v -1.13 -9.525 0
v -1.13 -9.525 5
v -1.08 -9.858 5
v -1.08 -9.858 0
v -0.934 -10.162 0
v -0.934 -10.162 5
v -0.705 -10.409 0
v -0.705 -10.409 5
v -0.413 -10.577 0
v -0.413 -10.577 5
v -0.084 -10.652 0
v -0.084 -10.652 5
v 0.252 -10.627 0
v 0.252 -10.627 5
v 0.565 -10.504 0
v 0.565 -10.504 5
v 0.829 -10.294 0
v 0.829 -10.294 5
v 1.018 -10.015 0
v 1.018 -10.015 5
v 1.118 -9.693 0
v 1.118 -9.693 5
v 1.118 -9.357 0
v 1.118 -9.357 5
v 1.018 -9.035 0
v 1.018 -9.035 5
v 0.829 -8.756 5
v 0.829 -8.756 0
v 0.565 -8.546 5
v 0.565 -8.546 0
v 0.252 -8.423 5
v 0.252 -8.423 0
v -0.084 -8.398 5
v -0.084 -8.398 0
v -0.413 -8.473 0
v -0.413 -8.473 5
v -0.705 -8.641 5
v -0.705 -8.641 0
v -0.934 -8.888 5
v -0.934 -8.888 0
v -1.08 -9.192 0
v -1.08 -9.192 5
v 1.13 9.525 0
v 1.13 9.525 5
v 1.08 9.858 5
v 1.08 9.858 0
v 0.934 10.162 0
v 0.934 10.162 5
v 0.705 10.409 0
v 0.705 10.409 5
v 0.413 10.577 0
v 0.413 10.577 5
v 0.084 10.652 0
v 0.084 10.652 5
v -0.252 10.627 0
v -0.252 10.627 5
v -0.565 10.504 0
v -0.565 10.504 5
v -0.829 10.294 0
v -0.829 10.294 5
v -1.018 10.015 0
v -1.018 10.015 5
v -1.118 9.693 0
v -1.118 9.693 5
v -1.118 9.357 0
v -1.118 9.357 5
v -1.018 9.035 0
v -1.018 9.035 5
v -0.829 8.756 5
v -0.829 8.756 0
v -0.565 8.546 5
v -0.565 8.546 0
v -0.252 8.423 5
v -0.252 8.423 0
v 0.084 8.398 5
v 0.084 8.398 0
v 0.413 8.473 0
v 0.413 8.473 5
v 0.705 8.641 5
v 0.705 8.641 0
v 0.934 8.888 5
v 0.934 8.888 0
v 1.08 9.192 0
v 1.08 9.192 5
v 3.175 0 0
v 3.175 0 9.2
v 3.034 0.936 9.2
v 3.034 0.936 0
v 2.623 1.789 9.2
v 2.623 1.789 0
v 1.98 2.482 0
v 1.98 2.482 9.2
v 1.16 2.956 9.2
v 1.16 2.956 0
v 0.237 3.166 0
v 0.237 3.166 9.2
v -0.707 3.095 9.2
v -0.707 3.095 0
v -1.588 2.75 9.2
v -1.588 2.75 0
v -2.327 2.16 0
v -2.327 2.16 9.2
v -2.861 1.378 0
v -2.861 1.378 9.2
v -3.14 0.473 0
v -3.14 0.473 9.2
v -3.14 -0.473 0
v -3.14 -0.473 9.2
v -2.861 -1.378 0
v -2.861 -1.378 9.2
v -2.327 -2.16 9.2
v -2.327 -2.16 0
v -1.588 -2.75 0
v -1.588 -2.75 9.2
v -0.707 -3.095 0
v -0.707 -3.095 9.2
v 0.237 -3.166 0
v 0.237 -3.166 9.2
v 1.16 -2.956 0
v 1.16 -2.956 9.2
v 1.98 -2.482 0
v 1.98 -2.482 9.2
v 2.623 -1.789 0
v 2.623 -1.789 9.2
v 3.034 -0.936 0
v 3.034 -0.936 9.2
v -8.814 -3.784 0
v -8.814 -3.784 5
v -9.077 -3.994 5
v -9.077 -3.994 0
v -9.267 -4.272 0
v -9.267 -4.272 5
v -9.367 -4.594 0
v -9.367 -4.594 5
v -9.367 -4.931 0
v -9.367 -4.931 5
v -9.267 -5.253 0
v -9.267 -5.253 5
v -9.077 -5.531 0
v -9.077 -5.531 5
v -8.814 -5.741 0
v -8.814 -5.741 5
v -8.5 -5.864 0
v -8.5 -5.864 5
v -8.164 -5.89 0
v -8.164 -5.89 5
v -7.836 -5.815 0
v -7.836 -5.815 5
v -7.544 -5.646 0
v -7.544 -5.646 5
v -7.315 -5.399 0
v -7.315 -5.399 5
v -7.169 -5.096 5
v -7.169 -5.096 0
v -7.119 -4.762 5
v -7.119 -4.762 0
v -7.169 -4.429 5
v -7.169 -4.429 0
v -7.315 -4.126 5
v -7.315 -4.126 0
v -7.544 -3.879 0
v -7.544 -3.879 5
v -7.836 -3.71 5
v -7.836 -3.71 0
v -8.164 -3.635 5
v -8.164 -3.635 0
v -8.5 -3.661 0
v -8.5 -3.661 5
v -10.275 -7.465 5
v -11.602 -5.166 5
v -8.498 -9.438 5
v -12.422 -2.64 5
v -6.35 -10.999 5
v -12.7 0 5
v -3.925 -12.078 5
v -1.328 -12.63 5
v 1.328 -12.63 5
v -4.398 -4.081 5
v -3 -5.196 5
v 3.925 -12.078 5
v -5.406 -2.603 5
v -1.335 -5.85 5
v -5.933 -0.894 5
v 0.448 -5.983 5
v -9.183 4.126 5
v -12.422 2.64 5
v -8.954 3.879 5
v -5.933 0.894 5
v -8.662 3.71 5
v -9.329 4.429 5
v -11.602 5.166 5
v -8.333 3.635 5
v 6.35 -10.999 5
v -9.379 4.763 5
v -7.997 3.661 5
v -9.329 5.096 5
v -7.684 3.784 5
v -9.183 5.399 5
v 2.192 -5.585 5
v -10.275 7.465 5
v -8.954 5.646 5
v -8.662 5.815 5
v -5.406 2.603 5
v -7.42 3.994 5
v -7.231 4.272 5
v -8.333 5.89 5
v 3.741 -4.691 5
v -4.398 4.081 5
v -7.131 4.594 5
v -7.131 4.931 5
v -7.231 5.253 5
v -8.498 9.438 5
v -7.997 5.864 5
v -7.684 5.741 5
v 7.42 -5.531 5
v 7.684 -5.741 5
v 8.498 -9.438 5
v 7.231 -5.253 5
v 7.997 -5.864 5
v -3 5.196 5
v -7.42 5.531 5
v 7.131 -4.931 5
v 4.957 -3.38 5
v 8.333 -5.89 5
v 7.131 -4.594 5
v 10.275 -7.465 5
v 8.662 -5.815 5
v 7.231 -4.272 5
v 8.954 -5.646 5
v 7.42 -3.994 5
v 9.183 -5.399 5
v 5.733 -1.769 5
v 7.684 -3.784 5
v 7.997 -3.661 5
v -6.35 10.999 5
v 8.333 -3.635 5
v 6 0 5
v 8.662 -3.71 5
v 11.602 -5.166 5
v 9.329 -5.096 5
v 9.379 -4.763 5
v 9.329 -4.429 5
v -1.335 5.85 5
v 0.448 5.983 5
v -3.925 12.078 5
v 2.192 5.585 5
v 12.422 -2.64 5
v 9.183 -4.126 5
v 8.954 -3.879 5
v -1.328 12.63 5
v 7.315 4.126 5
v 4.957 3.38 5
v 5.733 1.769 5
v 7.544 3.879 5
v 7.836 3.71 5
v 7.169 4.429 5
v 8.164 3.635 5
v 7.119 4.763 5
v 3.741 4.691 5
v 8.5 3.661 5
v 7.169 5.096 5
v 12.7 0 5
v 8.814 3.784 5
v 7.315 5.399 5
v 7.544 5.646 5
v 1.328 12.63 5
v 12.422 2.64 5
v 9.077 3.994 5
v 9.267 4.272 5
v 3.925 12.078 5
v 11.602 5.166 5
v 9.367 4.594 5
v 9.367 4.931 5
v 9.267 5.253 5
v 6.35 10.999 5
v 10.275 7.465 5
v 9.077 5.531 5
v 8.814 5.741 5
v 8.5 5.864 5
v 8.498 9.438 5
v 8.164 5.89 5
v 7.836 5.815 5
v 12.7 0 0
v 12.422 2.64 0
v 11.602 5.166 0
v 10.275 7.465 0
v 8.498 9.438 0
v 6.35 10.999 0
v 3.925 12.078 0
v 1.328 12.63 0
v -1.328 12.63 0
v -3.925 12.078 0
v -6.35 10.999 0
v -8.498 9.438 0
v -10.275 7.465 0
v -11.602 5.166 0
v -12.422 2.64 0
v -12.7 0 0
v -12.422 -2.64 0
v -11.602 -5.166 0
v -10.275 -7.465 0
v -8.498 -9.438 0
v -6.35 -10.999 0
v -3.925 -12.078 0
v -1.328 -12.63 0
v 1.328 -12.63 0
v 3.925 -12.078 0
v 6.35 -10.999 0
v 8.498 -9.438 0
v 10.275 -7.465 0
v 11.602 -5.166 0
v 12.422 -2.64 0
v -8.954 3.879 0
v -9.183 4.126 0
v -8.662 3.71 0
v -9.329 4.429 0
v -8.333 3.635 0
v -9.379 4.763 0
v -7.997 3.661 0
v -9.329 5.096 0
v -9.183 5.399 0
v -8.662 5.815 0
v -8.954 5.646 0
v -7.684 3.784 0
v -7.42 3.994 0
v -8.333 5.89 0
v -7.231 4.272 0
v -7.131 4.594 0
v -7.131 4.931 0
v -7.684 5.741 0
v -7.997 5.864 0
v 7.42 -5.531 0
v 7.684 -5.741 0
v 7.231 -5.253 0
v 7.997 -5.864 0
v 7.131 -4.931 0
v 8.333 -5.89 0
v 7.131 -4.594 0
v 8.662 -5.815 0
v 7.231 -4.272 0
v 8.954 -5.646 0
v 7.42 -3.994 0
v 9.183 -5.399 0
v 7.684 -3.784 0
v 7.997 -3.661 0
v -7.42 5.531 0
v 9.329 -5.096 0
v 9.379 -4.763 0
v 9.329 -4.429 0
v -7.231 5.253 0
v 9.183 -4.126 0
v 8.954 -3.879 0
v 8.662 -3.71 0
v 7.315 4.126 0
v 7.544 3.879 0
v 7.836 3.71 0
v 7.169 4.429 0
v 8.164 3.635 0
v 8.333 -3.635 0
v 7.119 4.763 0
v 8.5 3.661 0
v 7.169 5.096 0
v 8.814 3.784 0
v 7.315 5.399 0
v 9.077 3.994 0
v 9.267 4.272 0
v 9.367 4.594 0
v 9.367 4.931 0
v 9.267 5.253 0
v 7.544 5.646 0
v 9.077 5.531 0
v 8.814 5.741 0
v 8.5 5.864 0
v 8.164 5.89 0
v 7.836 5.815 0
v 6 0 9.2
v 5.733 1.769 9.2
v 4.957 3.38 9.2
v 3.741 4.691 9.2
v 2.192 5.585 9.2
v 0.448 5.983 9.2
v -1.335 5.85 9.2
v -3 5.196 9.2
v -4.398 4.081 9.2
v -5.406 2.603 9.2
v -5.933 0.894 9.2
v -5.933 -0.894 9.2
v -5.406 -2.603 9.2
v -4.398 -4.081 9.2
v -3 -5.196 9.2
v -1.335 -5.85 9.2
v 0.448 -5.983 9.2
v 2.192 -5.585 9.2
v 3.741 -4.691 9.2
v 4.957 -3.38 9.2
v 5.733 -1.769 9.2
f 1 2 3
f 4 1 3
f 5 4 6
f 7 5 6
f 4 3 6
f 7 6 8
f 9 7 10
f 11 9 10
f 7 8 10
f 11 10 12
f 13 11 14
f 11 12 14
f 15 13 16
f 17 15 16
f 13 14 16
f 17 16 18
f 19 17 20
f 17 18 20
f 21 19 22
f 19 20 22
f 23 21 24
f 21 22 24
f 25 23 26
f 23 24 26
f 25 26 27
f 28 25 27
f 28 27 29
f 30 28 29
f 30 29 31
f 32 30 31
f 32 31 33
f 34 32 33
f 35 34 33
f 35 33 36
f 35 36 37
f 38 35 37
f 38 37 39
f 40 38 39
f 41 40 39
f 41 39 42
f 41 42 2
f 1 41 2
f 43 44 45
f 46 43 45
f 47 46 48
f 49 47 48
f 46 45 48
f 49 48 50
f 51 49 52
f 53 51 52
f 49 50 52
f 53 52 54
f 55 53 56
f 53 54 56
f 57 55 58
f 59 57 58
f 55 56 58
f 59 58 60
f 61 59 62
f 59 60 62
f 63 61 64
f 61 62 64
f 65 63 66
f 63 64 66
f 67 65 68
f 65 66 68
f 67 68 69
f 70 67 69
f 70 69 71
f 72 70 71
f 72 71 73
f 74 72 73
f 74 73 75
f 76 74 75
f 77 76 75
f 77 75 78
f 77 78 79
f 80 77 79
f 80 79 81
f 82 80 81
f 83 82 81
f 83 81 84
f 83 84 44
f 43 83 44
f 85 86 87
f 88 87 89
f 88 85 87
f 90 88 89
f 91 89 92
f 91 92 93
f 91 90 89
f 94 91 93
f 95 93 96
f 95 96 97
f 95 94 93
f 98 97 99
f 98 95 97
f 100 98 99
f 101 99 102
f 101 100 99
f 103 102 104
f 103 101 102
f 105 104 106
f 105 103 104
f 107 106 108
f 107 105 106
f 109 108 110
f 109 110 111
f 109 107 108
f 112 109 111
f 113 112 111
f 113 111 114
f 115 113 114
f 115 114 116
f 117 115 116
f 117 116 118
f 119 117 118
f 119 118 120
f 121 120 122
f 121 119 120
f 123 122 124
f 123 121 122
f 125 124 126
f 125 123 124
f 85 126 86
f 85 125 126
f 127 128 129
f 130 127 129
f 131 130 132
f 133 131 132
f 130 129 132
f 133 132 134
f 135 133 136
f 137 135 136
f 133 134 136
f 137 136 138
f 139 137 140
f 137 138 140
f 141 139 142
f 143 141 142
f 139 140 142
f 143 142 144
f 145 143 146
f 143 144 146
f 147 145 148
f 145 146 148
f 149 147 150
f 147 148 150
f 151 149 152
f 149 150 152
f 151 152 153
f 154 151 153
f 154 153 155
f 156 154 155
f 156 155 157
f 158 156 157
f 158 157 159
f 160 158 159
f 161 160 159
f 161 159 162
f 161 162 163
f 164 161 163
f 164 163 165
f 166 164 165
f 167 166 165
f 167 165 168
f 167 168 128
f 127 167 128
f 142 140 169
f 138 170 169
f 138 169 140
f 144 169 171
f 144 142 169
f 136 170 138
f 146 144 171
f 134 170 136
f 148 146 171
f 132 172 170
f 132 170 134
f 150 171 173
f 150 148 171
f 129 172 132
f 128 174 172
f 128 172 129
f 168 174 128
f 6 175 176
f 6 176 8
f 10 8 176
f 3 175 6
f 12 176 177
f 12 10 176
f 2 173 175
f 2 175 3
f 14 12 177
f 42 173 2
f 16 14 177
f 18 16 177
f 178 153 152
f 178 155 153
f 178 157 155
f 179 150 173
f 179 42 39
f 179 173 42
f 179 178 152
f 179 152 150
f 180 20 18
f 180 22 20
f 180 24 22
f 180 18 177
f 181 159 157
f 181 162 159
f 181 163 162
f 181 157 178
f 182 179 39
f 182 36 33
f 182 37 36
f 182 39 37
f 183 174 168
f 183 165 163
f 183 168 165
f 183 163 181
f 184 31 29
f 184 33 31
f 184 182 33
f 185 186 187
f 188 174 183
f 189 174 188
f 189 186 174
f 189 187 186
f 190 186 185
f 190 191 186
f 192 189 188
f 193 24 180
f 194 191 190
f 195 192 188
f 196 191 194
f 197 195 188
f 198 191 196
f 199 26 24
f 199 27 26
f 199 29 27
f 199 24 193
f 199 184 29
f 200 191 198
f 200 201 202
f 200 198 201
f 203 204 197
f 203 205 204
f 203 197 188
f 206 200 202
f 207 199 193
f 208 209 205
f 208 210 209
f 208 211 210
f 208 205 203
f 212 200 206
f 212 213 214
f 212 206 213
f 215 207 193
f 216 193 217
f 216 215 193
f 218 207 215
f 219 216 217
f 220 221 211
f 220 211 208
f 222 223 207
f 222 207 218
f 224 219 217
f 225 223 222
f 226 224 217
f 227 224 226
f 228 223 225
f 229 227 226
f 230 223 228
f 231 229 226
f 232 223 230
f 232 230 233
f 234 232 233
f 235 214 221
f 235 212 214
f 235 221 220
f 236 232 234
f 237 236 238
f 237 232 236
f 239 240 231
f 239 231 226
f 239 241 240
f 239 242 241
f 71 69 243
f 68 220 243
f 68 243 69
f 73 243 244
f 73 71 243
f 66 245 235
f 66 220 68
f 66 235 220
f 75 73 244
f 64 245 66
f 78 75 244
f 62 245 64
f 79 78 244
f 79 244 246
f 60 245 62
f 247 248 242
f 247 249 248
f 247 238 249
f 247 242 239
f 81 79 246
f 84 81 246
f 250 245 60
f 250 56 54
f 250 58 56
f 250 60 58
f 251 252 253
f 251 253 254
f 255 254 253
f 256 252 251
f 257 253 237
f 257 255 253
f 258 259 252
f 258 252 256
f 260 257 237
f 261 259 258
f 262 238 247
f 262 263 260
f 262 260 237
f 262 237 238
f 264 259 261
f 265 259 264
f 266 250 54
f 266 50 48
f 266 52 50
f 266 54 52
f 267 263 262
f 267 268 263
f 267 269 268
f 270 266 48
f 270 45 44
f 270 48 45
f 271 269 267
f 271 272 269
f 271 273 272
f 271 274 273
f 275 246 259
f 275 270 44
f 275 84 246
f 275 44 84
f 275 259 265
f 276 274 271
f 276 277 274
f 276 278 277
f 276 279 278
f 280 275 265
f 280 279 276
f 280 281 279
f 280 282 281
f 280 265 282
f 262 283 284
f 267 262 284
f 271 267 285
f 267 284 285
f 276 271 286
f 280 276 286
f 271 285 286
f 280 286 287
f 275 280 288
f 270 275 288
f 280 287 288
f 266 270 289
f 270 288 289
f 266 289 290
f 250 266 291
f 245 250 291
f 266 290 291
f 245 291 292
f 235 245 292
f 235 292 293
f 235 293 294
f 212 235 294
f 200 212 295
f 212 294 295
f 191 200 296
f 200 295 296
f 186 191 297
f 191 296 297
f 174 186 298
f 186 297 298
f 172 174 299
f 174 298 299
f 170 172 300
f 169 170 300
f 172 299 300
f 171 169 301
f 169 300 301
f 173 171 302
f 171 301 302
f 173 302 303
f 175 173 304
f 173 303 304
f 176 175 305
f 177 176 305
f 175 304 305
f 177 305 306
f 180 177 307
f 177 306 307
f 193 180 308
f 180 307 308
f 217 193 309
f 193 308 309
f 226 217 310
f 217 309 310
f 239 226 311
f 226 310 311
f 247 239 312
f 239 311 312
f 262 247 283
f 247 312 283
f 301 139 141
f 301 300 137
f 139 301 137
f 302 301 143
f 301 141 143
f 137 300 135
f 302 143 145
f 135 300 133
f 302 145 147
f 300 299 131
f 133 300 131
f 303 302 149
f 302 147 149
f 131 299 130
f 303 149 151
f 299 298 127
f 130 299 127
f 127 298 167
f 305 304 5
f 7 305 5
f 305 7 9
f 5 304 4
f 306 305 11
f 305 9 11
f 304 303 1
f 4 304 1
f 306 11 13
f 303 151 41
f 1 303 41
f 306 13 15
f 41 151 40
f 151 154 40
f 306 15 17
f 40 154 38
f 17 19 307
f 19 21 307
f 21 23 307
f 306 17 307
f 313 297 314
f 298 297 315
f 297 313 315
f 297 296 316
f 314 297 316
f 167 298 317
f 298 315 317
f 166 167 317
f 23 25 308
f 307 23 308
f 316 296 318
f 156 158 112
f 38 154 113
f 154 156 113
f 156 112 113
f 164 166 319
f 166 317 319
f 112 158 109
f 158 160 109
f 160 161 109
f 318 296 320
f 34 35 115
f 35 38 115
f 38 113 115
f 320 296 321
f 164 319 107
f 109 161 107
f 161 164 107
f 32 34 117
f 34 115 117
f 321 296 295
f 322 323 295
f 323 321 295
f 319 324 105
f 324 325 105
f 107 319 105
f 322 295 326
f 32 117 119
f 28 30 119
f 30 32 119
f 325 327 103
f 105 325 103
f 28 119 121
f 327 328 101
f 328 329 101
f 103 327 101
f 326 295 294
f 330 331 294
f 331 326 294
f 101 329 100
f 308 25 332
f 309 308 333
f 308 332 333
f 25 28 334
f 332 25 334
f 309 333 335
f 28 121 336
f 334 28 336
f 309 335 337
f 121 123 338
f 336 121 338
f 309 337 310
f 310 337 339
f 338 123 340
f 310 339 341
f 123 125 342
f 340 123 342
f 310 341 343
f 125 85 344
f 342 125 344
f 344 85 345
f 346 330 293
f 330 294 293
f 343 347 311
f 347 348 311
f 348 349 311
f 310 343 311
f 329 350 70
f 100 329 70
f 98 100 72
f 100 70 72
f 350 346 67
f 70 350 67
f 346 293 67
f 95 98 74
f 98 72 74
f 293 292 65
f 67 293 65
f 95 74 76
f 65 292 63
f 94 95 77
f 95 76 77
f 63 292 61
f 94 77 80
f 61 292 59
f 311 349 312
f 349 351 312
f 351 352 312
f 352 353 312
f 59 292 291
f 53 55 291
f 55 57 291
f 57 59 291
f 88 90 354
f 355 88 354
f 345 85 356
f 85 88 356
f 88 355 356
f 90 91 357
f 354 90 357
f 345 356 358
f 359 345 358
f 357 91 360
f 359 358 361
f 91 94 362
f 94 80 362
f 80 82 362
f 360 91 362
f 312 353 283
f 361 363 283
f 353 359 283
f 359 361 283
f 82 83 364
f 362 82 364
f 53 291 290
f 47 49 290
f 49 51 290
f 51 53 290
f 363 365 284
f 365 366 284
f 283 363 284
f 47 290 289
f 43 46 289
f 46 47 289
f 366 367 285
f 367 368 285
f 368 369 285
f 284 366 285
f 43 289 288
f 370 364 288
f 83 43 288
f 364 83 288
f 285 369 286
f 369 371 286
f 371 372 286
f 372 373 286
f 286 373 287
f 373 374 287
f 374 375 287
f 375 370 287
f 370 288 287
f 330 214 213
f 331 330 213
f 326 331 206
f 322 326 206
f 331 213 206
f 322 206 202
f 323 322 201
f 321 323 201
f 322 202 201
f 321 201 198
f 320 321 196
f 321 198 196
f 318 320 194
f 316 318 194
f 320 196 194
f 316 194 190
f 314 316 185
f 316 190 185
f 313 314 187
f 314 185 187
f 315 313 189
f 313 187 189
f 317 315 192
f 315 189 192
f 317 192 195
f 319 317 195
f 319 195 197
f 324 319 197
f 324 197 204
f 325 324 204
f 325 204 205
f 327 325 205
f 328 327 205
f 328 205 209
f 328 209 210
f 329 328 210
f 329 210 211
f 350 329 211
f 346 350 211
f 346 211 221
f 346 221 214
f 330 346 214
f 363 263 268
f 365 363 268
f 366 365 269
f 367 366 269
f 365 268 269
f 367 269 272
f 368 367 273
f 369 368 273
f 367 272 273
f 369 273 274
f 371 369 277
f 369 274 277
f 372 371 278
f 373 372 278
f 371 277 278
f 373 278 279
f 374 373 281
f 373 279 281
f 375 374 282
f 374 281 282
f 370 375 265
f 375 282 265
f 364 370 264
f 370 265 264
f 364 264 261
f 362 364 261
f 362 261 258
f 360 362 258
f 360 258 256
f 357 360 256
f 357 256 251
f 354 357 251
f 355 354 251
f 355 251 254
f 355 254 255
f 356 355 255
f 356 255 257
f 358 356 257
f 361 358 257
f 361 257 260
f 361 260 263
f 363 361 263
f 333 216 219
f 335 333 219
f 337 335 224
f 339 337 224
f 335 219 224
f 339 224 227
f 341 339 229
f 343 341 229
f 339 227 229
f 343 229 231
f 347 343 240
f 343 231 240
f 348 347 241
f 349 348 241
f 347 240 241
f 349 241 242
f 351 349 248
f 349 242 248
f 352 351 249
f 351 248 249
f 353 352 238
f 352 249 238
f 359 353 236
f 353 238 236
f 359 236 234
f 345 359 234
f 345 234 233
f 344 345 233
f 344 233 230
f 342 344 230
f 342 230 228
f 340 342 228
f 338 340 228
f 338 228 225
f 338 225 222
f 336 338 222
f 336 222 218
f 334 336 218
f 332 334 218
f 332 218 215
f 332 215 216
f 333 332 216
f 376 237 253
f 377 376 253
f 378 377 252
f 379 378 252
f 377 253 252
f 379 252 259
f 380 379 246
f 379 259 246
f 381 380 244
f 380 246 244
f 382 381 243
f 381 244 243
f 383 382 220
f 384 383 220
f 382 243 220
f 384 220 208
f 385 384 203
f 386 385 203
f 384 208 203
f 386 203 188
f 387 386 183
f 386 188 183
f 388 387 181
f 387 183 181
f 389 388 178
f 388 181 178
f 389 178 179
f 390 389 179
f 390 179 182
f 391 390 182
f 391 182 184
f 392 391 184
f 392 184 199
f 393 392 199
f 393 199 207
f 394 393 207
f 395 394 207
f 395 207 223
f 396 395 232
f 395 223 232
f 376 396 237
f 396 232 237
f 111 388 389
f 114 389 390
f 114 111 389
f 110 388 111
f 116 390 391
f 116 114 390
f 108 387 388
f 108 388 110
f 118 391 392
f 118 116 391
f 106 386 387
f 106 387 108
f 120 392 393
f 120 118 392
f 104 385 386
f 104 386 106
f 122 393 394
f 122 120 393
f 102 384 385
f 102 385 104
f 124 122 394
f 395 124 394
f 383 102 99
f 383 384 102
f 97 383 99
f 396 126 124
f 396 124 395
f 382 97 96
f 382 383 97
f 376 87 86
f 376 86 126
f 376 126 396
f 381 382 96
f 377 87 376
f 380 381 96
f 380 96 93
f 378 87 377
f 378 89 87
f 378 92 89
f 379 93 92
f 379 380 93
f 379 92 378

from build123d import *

# Parameters (mm, degrees)
SKETCH2_R           = 12.7
SKETCH2_R_2         = 3.175
BOSS_EXTRUDE1_DEPTH = 5
SKETCH3_R           = 6
SKETCH3_R_2         = 3.175
BOSS_EXTRUDE2_DEPTH = 4.2
CUT_EXTRUDE1_REACH  = 20.643
SKETCH4_R           = 1.1303
CIRPATTERN1_COUNT   = 6


with BuildPart() as part:
    # Sketch2 → Boss-Extrude1 (new body)
    with BuildSketch(Plane.XY):
        Circle(SKETCH2_R)
        Circle(SKETCH2_R_2, mode=Mode.SUBTRACT)
    extrude(amount=BOSS_EXTRUDE1_DEPTH)

    # Sketch3 → Boss-Extrude2 (add)
    with BuildSketch(Plane.XY.offset(5)):
        Circle(SKETCH3_R)
        Circle(SKETCH3_R_2, mode=Mode.SUBTRACT)
    extrude(amount=BOSS_EXTRUDE2_DEPTH)

    # Sketch4 → Cut-Extrude1 (cut, up to next)
    with BuildSketch(Plane.XY.offset(5), mode=Mode.PRIVATE) as cut_extrude1_sk1:
        with Locations((0, 9.525)):
            Circle(SKETCH4_R)
    cut_extrude1_tool1 = extrude(cut_extrude1_sk1.sketch, amount=-CUT_EXTRUDE1_REACH, mode=Mode.PRIVATE) & part.part
    cut_extrude1 = cut_extrude1_tool1.solids().sort_by_distance((0, 9.525, 5))[0]
    add(cut_extrude1, mode=Mode.SUBTRACT)

    # CirPattern1: Cut-Extrude1 ×6 about axis
    cirpattern1_axis = Axis((0, 0, 0), (0, 0, 1))
    for i in range(1, CIRPATTERN1_COUNT):
        add(cut_extrude1.rotate(cirpattern1_axis, i * 360 / CIRPATTERN1_COUNT), mode=Mode.SUBTRACT)


solid = part.part
